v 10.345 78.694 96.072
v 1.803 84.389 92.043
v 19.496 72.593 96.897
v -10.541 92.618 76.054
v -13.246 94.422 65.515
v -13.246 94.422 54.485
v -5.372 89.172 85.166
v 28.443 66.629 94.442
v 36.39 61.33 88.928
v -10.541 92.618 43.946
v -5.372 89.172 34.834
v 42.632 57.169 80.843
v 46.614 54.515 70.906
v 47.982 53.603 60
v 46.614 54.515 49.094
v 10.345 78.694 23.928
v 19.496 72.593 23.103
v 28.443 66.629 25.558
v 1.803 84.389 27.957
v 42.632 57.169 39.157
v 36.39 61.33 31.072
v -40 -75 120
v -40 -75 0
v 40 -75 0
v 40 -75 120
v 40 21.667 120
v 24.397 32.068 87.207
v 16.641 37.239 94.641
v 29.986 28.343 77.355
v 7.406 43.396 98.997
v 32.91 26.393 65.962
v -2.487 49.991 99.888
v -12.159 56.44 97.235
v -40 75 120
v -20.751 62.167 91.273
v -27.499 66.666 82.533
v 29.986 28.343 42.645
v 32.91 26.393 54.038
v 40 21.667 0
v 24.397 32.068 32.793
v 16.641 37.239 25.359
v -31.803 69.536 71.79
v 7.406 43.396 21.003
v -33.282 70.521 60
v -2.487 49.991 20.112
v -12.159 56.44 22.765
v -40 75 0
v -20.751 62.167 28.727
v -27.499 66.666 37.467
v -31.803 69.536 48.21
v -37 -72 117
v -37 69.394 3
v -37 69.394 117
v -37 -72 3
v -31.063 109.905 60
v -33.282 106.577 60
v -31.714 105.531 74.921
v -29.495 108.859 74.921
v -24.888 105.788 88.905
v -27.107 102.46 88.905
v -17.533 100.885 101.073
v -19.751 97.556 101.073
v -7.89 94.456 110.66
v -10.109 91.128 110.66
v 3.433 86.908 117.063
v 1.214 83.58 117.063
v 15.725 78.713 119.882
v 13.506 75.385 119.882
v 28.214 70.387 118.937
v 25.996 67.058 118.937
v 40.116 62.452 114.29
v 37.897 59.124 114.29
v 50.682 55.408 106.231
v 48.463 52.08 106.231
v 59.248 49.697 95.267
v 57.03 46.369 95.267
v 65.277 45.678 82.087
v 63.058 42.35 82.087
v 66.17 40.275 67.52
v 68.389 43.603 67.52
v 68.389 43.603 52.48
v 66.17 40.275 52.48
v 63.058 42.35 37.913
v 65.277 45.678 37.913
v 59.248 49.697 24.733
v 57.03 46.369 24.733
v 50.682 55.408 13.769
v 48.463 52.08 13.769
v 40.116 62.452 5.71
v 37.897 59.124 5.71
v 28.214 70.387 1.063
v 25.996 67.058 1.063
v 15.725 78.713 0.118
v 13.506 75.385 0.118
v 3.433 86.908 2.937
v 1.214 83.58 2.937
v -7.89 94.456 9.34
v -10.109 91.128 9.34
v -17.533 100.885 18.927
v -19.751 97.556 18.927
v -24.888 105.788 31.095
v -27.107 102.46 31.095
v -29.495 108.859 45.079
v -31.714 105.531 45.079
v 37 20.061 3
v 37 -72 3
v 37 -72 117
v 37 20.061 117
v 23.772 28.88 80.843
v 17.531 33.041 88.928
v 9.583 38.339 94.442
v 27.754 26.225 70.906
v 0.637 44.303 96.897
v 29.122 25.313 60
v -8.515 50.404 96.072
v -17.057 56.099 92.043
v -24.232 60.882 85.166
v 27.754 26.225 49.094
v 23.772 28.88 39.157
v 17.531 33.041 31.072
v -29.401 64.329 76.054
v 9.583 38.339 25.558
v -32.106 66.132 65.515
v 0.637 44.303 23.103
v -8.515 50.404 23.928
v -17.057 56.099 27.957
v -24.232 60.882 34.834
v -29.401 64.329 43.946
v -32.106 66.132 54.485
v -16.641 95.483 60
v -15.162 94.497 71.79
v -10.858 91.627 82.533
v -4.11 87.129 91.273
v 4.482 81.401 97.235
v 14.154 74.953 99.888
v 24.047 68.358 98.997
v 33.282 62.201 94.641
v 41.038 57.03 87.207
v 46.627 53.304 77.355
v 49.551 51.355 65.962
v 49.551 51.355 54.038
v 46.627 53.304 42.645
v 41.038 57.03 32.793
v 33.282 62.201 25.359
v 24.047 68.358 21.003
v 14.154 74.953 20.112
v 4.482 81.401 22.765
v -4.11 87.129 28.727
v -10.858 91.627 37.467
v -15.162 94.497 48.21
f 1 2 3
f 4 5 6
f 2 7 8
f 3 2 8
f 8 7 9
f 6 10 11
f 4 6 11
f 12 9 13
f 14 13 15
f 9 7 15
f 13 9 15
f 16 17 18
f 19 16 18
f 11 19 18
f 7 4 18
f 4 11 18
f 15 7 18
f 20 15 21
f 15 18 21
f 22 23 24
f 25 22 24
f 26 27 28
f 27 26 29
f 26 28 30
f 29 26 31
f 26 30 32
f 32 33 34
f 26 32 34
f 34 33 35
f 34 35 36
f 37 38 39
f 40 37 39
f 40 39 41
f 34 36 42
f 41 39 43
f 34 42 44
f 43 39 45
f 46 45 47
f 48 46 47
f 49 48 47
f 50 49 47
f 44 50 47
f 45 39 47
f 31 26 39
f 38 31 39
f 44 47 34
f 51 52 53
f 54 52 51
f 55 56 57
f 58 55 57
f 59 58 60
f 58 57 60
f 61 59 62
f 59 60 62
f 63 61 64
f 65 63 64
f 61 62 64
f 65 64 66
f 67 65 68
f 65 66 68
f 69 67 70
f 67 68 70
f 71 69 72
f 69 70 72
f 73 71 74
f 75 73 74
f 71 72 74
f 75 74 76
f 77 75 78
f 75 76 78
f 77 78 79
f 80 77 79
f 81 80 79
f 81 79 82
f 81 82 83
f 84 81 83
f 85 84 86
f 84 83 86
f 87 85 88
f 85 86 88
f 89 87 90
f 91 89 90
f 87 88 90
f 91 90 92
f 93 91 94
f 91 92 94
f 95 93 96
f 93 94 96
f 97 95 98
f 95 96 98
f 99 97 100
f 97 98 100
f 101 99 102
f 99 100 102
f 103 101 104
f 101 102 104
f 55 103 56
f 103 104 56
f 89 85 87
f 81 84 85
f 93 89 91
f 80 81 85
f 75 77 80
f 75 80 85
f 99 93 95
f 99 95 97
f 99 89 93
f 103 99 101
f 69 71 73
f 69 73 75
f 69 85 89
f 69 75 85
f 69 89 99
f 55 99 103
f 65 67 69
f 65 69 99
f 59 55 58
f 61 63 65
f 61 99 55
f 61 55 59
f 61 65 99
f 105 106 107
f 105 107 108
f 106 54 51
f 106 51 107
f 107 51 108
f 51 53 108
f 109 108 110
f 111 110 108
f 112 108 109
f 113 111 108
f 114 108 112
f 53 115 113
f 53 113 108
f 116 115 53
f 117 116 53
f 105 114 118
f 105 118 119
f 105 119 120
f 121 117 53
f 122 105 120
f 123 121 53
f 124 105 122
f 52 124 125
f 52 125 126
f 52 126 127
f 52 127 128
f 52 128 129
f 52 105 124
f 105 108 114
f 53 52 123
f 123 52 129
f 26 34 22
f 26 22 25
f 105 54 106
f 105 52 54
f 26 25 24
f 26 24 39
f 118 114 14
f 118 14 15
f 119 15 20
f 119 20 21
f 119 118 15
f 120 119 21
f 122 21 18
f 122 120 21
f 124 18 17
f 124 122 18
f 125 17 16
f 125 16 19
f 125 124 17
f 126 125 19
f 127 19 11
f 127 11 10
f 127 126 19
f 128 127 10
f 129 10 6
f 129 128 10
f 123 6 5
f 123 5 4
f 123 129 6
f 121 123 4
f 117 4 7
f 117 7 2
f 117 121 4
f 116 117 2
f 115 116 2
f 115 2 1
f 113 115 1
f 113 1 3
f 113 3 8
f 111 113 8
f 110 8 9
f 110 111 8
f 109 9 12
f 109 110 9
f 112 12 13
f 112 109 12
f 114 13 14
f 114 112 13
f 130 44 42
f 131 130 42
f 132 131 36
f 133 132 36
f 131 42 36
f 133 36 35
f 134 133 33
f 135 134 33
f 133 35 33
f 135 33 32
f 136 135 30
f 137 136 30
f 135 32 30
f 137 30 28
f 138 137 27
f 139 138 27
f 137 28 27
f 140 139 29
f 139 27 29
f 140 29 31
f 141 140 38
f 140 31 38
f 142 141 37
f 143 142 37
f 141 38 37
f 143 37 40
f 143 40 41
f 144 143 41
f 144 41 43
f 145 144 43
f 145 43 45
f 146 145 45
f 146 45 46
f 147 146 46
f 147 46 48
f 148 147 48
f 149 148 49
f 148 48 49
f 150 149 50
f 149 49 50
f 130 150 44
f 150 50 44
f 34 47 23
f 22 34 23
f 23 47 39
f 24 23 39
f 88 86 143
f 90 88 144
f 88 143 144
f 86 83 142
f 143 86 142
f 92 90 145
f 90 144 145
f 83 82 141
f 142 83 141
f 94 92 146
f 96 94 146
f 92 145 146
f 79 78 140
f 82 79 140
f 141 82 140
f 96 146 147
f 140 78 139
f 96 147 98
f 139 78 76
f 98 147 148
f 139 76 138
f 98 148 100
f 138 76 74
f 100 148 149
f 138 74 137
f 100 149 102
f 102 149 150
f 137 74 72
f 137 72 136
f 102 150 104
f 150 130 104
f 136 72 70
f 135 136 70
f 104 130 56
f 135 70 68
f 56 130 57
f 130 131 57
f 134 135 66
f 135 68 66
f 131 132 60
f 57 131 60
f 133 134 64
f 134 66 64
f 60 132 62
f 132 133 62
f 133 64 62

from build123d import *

# Parameters (mm, degrees)
BOSS_EXTRUDE1_DEPTH = 120
SKETCH2_R           = 40
BOSS_EXTRUDE2_DEPTH = 30
SKETCH4_R           = 60
BOSS_EXTRUDE3_DEPTH = 4
SHELL1_START        = 3
SHELL1_DEPTH        = 114
SHELL1_START_2      = 37.215764226
SHELL1_2_OUTLINE_R  = 37
SHELL1_2_DEPTH      = 34


with BuildPart() as part:
    # Sketch1 → Boss-Extrude1 (new body)
    with BuildSketch(Plane.XY):
        Polygon((40, 21.666666667), (-40, 75), (-40, -75), (40, -75), align=None)
    extrude(amount=BOSS_EXTRUDE1_DEPTH)

    # Sketch2 → Boss-Extrude2 (add)
    with BuildSketch(Plane(origin=(22.307692308, 33.461538462, 0), x_dir=(0, 0, -1), z_dir=(0.5547001962252291, 0.8320502943378437, 0))):
        with Locations(Location((-60, 26.810509484, 0), (0, 0, 90))):
            Circle(SKETCH2_R)
    extrude(amount=BOSS_EXTRUDE2_DEPTH)

    # Sketch4 → Boss-Extrude3 (add)
    with BuildSketch(Plane(origin=(38.948698194, 58.423047292, 0), x_dir=(0, 0, -1), z_dir=(0.5547001962252291, 0.8320502943378437, 0))):
        with Locations(Location((-60, 26.810509484, 0), (0, 0, 90))):
            Circle(SKETCH4_R)
    extrude(amount=BOSS_EXTRUDE3_DEPTH)

    # Shell1: read off the stored shape, not the designer's step
    # Shell1 outline → Shell1 (cut)
    with BuildSketch(Plane.XY.offset(SHELL1_START)):
        Polygon((-37, -72), (37, -72), (37, 20.061115391), (-37, 69.394448725), align=None)
    extrude(amount=SHELL1_DEPTH, mode=Mode.SUBTRACT)

    # Shell1 2 outline → Shell1 2 (cut)
    with BuildSketch(Plane(origin=(0, 0, 0), x_dir=(0.8320502943378438, -0.5547001962252289, 0), z_dir=(0.5547001962252289, 0.8320502943378438, 0)).offset(SHELL1_START_2)):
        with Locations((-26.810509484, -60)):
            Circle(SHELL1_2_OUTLINE_R)
    extrude(amount=SHELL1_2_DEPTH, mode=Mode.SUBTRACT)


solid = part.part
